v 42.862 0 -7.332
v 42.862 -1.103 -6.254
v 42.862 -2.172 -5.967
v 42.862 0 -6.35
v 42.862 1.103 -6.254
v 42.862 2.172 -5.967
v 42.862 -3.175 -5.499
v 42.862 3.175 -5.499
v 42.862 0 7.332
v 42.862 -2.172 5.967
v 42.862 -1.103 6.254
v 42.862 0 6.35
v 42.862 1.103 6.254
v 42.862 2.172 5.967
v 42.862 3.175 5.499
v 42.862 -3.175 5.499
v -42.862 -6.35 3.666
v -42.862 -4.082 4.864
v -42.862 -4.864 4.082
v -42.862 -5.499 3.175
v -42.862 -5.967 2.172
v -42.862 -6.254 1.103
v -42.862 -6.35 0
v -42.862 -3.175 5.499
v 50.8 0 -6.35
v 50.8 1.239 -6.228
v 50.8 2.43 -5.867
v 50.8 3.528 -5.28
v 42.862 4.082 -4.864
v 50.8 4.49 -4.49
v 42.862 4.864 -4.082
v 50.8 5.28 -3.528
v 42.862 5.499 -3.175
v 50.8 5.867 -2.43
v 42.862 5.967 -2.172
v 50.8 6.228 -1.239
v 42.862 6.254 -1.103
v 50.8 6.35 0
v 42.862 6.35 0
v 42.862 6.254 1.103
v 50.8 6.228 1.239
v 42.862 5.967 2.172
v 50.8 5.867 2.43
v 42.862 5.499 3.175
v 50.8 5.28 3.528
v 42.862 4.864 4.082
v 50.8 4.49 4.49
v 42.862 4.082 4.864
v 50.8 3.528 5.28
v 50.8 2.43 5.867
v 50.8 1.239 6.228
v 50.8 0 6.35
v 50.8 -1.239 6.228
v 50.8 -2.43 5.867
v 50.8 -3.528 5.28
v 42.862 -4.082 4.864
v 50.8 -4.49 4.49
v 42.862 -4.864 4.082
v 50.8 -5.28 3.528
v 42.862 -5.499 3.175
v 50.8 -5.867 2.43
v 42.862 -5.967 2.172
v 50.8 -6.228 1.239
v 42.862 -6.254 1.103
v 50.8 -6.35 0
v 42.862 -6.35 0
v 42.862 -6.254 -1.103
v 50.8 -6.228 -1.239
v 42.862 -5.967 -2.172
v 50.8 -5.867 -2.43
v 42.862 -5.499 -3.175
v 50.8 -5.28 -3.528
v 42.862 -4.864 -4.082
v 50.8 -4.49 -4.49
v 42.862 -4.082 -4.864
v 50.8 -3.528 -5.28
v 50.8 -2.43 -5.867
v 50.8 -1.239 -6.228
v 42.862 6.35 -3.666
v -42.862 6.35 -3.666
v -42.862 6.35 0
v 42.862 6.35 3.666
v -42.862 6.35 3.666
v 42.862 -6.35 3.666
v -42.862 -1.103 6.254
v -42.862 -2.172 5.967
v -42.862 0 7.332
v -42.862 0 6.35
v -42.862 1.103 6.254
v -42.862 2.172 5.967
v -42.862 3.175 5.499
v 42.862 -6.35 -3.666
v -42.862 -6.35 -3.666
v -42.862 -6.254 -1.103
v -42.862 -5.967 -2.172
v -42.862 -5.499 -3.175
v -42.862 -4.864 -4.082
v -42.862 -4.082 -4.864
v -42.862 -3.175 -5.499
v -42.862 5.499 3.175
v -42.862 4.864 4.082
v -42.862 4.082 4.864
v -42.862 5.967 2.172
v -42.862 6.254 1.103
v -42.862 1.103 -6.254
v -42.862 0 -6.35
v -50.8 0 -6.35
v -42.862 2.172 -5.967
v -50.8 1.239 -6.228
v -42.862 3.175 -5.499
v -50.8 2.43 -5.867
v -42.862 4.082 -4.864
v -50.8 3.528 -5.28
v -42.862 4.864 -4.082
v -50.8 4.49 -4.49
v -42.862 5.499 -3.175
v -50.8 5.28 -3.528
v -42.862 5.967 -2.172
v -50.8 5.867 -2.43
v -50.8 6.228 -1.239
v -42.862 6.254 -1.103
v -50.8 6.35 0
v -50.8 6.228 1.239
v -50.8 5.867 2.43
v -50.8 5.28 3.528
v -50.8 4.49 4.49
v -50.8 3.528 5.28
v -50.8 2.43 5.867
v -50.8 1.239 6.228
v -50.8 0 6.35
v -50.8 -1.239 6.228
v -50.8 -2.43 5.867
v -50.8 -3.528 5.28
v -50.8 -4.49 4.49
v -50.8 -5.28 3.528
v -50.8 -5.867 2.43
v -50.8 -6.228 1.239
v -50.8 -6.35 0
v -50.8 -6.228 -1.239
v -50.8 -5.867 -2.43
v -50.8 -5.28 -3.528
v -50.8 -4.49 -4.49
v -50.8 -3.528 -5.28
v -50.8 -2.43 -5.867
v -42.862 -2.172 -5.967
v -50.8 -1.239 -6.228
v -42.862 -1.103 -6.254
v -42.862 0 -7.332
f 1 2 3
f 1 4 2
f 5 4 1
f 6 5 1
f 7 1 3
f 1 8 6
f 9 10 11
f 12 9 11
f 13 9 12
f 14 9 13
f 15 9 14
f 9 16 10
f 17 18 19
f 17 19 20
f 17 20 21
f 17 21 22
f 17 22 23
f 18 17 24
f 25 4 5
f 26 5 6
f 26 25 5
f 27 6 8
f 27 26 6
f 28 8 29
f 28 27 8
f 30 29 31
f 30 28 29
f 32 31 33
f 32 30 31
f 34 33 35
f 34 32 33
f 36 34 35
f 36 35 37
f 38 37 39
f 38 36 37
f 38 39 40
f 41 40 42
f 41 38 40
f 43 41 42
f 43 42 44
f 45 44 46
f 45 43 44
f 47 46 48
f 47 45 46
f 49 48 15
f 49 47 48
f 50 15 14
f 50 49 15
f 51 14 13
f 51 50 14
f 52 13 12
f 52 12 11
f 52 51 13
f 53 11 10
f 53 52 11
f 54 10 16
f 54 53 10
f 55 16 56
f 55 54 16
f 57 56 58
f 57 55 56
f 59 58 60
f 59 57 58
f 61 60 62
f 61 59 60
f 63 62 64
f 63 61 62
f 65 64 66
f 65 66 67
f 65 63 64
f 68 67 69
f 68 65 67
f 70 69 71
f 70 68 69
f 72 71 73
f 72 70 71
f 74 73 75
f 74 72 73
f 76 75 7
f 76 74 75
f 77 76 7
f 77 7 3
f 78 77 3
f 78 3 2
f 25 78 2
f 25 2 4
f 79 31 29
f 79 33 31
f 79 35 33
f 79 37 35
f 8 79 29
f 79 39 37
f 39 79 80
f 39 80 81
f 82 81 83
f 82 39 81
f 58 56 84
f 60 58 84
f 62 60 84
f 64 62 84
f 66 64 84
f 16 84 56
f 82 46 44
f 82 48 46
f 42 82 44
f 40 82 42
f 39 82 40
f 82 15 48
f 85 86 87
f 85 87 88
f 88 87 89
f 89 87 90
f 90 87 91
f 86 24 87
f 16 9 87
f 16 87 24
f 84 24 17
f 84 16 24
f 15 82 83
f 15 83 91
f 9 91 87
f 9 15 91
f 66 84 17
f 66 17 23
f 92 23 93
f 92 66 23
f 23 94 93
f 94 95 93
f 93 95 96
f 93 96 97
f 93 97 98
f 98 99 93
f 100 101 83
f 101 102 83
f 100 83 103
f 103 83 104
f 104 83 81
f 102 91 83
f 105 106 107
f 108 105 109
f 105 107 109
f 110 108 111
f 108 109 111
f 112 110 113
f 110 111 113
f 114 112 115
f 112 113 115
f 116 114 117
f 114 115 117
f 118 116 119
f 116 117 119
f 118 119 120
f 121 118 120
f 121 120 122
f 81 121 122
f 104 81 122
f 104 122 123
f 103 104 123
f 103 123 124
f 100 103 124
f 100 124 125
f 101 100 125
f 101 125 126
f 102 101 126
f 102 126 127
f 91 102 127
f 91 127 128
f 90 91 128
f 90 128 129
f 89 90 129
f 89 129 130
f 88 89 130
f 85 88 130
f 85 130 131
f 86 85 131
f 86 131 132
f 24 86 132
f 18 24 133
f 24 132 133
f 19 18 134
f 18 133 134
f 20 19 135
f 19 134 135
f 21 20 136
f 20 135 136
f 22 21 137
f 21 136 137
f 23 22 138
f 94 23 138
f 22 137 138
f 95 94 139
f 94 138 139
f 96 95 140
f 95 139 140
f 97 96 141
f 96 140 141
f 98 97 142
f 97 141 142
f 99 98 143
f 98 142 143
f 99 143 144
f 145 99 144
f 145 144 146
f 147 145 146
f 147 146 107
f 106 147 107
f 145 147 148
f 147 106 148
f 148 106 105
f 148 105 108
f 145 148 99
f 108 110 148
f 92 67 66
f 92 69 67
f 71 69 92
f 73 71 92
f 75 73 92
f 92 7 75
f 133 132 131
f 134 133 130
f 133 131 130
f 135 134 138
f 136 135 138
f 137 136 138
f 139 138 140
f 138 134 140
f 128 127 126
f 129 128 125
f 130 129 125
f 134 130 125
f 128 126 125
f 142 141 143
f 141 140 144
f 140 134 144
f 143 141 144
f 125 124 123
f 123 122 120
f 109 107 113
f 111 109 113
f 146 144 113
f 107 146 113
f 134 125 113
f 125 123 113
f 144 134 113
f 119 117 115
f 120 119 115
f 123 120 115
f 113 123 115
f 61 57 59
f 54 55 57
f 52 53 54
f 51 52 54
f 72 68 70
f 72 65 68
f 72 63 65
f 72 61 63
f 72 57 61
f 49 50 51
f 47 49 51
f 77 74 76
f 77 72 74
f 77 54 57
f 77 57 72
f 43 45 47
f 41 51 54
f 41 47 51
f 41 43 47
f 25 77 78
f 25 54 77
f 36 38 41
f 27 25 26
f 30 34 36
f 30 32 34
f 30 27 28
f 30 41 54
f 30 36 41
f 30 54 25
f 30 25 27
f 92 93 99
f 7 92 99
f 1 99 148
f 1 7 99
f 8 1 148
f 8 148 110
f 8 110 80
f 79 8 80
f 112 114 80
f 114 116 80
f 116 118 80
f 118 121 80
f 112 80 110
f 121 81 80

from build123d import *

# Parameters (mm, degrees)
BOSS_EXTRUDE1_DEPTH     = 50.8
SKETCH3_R               = 8.89
SKETCH3_R_2             = 6.35
CUT_EXTRUDE_THIN1_DEPTH = 7.9375


with BuildPart() as part:
    # Sketch2 → Boss-Extrude1 (new body, symmetric)
    with BuildSketch(Plane(origin=(0, 0, 0), x_dir=(0, 0, -1), z_dir=(1, 0, 0))):
        Polygon((7.332348419, 0), (3.666174209, 6.35), (-3.666174209, 6.35), (-7.332348419, 0), (-3.666174209, -6.35), (3.666174209, -6.35), align=None)
    extrude(amount=BOSS_EXTRUDE1_DEPTH, both=True)

    # Sketch3 → Cut-Extrude-Thin1 (cut)
    with BuildSketch(Plane(origin=(50.8, 0, 0), x_dir=(0, 0, -1), z_dir=(1, 0, 0))):
        Circle(SKETCH3_R)
        Circle(SKETCH3_R_2, mode=Mode.SUBTRACT)
    cut_extrude_thin1 = extrude(amount=-CUT_EXTRUDE_THIN1_DEPTH, mode=Mode.SUBTRACT)

    # Mirror1: Cut-Extrude-Thin1 across plane
    add(cut_extrude_thin1.mirror(Plane(origin=(0, 0, 0), x_dir=(0, 0, 1), z_dir=(1, 0, 0))), mode=Mode.SUBTRACT)


solid = part.part
